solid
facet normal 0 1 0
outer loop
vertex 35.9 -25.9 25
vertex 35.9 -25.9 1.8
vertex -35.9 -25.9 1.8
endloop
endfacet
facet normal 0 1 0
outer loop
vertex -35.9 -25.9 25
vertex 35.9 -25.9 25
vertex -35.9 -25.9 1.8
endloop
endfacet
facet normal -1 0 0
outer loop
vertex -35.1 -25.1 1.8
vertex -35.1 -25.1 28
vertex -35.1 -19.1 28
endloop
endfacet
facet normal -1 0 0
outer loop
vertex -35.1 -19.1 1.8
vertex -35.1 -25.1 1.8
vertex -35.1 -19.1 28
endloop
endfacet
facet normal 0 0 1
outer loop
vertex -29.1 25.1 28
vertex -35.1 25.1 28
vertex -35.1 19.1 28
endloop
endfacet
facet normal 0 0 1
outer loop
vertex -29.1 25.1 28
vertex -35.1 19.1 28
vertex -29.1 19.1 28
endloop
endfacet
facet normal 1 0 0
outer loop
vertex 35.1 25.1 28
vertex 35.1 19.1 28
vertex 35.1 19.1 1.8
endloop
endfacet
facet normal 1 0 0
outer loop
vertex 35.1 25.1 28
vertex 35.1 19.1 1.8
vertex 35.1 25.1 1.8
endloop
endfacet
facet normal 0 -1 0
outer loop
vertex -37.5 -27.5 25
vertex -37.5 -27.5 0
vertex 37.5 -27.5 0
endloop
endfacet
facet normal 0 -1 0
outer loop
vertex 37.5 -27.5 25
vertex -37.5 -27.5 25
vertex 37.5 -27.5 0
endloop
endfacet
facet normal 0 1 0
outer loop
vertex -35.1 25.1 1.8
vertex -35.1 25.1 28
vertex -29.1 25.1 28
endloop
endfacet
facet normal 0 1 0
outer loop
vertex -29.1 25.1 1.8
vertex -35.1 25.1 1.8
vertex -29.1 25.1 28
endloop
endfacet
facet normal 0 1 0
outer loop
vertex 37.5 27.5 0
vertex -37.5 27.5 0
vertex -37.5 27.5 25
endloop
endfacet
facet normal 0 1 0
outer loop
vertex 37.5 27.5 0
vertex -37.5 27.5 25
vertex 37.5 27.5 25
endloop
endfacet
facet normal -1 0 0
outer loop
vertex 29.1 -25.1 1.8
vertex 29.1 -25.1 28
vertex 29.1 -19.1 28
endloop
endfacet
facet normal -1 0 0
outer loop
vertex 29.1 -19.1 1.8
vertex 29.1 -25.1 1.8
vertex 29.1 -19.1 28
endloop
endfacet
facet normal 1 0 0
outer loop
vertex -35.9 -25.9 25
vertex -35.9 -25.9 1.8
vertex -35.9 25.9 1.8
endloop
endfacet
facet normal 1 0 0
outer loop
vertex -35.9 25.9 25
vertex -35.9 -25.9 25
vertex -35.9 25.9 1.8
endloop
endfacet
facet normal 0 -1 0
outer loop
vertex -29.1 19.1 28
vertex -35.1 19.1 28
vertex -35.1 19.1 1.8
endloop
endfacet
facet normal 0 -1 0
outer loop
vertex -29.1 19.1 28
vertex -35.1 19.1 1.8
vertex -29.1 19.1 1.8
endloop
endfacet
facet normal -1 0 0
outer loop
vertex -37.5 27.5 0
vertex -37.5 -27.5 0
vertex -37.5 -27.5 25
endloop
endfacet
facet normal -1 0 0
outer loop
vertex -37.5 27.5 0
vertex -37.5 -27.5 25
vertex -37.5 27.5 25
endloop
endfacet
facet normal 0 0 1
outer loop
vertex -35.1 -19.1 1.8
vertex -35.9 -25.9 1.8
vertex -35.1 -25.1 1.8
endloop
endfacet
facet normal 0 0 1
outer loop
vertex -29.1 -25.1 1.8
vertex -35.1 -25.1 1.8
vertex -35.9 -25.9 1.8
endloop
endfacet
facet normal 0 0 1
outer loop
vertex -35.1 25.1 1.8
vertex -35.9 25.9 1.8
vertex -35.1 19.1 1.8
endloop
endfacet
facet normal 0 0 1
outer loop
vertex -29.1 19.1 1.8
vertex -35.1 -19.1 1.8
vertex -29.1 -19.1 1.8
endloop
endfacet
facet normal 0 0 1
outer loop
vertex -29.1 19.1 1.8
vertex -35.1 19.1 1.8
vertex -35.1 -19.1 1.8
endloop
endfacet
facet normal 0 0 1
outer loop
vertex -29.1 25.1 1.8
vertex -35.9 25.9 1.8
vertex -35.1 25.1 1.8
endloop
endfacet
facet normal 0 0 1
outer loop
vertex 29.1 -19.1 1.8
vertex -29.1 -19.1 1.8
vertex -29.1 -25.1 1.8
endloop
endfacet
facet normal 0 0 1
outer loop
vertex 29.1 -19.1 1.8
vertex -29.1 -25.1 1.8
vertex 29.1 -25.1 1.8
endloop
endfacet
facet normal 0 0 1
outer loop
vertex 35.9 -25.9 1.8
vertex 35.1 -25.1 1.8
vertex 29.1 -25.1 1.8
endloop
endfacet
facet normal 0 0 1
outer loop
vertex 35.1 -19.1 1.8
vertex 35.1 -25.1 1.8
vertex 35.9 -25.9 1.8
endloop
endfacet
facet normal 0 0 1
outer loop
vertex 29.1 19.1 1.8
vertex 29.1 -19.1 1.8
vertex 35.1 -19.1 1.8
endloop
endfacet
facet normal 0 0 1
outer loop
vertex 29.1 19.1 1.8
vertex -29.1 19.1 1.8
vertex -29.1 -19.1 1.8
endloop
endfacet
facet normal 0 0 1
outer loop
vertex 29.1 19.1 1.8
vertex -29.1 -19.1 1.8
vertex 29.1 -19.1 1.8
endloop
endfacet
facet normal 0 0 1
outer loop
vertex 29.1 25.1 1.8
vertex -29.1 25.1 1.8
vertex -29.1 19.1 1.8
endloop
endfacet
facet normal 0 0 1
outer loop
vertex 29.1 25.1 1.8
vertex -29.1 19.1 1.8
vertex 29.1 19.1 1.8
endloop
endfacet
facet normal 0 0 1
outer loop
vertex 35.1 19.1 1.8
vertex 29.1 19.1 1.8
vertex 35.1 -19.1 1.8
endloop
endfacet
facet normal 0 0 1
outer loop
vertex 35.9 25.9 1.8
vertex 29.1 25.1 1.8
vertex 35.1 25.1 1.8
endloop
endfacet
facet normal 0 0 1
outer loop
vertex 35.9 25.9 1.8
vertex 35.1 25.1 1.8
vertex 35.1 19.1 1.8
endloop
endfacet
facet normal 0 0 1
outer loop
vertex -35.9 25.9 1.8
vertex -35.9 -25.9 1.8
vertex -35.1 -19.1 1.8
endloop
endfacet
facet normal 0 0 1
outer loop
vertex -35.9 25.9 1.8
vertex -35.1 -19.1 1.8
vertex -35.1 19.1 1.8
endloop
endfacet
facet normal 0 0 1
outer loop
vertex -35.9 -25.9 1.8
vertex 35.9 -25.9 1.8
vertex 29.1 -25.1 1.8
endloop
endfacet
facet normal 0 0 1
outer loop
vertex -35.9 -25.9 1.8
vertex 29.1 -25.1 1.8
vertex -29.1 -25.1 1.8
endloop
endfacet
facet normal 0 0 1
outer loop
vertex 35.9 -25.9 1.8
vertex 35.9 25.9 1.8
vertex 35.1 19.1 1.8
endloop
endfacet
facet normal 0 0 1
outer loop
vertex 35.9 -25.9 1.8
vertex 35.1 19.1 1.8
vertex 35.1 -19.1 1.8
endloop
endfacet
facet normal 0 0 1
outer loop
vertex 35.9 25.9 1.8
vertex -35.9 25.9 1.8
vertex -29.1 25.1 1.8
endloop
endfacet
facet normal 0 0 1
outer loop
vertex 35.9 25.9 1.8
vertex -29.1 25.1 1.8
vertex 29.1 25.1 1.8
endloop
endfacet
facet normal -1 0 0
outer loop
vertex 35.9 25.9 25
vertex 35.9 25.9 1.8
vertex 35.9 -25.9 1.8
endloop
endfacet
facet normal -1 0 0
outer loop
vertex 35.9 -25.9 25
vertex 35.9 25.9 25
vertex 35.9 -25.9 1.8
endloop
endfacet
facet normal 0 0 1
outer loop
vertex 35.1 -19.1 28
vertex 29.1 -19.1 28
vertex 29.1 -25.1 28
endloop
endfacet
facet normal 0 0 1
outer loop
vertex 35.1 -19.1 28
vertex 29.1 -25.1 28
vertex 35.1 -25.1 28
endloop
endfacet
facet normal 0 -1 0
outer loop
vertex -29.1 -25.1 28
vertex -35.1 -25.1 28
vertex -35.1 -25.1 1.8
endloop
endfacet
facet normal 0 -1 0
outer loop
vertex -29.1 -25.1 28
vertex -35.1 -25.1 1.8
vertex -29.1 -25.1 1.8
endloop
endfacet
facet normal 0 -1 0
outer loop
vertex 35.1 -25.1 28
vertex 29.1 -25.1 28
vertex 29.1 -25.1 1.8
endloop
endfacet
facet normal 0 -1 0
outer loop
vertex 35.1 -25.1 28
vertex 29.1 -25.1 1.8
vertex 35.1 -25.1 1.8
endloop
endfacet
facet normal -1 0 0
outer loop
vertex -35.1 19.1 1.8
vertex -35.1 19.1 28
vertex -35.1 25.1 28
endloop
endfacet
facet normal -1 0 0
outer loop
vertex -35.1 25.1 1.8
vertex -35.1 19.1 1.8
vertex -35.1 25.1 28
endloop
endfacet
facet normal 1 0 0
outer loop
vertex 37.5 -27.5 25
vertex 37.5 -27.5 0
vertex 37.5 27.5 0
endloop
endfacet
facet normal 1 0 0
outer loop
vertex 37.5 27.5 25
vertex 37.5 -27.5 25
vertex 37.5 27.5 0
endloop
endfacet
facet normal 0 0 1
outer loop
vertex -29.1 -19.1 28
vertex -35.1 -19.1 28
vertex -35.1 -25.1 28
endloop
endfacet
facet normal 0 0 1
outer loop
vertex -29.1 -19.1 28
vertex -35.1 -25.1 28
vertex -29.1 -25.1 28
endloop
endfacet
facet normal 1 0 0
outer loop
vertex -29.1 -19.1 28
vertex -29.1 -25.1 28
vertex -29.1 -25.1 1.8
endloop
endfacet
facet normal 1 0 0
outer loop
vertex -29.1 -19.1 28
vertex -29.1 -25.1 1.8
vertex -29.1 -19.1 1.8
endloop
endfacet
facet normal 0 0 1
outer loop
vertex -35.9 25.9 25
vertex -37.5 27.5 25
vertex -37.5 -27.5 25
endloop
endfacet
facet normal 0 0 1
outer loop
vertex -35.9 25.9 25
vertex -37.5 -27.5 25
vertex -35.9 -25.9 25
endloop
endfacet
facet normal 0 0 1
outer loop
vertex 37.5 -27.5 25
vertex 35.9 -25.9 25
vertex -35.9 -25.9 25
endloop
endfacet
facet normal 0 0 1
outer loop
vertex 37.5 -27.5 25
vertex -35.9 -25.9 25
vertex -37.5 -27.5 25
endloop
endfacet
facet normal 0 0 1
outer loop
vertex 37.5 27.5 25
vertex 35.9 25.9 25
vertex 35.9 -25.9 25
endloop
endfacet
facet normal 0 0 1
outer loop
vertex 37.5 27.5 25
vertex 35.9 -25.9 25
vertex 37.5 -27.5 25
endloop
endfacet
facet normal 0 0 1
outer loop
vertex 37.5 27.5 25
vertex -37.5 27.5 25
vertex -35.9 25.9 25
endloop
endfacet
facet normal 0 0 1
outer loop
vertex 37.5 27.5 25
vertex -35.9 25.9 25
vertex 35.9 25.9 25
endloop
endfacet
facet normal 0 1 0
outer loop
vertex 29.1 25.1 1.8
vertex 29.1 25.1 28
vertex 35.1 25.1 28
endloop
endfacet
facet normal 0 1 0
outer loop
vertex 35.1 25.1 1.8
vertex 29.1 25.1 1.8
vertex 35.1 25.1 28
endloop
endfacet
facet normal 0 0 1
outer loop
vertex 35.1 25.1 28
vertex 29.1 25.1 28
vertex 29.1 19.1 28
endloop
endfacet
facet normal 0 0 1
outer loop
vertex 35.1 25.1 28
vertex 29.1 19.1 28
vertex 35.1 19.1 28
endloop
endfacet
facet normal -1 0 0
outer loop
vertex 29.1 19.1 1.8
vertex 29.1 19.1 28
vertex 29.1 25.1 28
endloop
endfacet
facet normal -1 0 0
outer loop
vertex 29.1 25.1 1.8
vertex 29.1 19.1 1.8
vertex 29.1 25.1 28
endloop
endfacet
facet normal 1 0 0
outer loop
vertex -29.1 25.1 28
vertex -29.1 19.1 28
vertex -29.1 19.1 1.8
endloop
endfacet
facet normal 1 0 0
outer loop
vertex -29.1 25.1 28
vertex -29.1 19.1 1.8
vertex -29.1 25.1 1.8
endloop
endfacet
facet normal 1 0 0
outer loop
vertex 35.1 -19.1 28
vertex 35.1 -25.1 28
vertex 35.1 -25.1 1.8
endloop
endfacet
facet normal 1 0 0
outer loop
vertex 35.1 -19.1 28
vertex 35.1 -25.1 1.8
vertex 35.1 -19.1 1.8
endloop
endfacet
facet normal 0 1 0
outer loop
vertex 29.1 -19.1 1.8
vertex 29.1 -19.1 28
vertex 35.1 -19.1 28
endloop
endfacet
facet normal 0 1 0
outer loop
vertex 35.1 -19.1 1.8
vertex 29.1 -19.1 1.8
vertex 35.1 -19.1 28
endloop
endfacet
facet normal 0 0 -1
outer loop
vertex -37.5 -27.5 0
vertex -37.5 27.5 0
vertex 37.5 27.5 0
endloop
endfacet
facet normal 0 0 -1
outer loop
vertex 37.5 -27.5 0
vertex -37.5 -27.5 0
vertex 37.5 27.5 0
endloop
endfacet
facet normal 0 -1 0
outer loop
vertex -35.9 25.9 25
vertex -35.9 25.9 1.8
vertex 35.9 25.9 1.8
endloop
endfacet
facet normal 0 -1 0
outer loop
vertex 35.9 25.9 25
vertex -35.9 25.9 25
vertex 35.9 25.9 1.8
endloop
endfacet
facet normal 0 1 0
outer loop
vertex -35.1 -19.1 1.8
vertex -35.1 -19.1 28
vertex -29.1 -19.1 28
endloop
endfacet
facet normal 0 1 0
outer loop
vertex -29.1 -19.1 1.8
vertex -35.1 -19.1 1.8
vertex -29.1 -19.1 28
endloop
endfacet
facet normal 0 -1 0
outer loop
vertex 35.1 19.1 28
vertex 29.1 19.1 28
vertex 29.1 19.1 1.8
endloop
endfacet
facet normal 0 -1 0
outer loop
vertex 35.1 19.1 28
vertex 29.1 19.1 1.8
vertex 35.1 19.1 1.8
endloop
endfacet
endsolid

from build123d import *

# Parameters (mm, degrees)
F0_W     = 6
F0_H     = 6
F1_DEPTH = 28
F0_W_2   = 75
F0_H_2   = 55
F2_DEPTH = 25
F3_DEPTH = 1.8


with BuildPart() as f1:
    # F0 (on Top) → F1 (new body)
    with BuildSketch(Plane.XY):
        with Locations((-32.1, 22.1)):
            Rectangle(F0_W, F0_H)
    extrude(amount=F1_DEPTH)



with BuildPart() as f1b:
    # F0 (on Top) → F1, piece 2 (new body)
    with BuildSketch(Plane.XY):
        with Locations((32.1, 22.1)):
            Rectangle(F0_W, F0_H)
    extrude(amount=F1_DEPTH)


with BuildPart() as f1c:
    # F0 (on Top) → F1, piece 3 (new body)
    with BuildSketch(Plane.XY):
        with Locations((-32.1, -22.1)):
            Rectangle(F0_W, F0_H)
    extrude(amount=F1_DEPTH)


with BuildPart() as f1d:
    # F0 (on Top) → F1, piece 4 (new body)
    with BuildSketch(Plane.XY):
        with Locations((32.1, -22.1)):
            Rectangle(F0_W, F0_H)
    extrude(amount=F1_DEPTH)


with BuildPart() as f2:
    # F0 (on Top) → F2 (new body)
    with BuildSketch(Plane.XY):
        Rectangle(F0_W_2, F0_H_2)
        Polygon((-35.9, 25.1), (-35.9, 25.9), (-35.1, 25.9), (35.1, 25.9), (35.9, 25.9), (35.9, 25.1), (35.9, -25.1), (35.9, -25.9), (35.1, -25.9), (-35.1, -25.9), (-35.9, -25.9), (-35.9, -25.1), align=None, mode=Mode.SUBTRACT)
    extrude(amount=F2_DEPTH)


with BuildPart() as f1_1:
    add(f1.part)

    add(f1b.part)  # F3 merges F1b

    add(f1c.part)  # F3 merges F1c

    add(f1d.part)  # F3 merges F1d

    add(f2.part)  # F3 merges F2
    # F0 (on Top) → F3 (join)
    with BuildSketch(Plane.XY):
        Polygon((-35.1, 25.9), (-35.9, 25.9), (-35.9, 25.1), (-35.9, -25.1), (-35.9, -25.9), (-35.1, -25.9), (35.1, -25.9), (35.9, -25.9), (35.9, -25.1), (35.9, 25.1), (35.9, 25.9), (35.1, 25.9), align=None)
        with Locations((-32.1, -22.1)):
            Rectangle(F0_W, F0_H, mode=Mode.SUBTRACT)
        with Locations((32.1, -22.1)):
            Rectangle(F0_W, F0_H, mode=Mode.SUBTRACT)
        with Locations((-32.1, 22.1)):
            Rectangle(F0_W, F0_H, mode=Mode.SUBTRACT)
        with Locations((32.1, 22.1)):
            Rectangle(F0_W, F0_H, mode=Mode.SUBTRACT)
    extrude(amount=F3_DEPTH)


solid = f1_1.part
